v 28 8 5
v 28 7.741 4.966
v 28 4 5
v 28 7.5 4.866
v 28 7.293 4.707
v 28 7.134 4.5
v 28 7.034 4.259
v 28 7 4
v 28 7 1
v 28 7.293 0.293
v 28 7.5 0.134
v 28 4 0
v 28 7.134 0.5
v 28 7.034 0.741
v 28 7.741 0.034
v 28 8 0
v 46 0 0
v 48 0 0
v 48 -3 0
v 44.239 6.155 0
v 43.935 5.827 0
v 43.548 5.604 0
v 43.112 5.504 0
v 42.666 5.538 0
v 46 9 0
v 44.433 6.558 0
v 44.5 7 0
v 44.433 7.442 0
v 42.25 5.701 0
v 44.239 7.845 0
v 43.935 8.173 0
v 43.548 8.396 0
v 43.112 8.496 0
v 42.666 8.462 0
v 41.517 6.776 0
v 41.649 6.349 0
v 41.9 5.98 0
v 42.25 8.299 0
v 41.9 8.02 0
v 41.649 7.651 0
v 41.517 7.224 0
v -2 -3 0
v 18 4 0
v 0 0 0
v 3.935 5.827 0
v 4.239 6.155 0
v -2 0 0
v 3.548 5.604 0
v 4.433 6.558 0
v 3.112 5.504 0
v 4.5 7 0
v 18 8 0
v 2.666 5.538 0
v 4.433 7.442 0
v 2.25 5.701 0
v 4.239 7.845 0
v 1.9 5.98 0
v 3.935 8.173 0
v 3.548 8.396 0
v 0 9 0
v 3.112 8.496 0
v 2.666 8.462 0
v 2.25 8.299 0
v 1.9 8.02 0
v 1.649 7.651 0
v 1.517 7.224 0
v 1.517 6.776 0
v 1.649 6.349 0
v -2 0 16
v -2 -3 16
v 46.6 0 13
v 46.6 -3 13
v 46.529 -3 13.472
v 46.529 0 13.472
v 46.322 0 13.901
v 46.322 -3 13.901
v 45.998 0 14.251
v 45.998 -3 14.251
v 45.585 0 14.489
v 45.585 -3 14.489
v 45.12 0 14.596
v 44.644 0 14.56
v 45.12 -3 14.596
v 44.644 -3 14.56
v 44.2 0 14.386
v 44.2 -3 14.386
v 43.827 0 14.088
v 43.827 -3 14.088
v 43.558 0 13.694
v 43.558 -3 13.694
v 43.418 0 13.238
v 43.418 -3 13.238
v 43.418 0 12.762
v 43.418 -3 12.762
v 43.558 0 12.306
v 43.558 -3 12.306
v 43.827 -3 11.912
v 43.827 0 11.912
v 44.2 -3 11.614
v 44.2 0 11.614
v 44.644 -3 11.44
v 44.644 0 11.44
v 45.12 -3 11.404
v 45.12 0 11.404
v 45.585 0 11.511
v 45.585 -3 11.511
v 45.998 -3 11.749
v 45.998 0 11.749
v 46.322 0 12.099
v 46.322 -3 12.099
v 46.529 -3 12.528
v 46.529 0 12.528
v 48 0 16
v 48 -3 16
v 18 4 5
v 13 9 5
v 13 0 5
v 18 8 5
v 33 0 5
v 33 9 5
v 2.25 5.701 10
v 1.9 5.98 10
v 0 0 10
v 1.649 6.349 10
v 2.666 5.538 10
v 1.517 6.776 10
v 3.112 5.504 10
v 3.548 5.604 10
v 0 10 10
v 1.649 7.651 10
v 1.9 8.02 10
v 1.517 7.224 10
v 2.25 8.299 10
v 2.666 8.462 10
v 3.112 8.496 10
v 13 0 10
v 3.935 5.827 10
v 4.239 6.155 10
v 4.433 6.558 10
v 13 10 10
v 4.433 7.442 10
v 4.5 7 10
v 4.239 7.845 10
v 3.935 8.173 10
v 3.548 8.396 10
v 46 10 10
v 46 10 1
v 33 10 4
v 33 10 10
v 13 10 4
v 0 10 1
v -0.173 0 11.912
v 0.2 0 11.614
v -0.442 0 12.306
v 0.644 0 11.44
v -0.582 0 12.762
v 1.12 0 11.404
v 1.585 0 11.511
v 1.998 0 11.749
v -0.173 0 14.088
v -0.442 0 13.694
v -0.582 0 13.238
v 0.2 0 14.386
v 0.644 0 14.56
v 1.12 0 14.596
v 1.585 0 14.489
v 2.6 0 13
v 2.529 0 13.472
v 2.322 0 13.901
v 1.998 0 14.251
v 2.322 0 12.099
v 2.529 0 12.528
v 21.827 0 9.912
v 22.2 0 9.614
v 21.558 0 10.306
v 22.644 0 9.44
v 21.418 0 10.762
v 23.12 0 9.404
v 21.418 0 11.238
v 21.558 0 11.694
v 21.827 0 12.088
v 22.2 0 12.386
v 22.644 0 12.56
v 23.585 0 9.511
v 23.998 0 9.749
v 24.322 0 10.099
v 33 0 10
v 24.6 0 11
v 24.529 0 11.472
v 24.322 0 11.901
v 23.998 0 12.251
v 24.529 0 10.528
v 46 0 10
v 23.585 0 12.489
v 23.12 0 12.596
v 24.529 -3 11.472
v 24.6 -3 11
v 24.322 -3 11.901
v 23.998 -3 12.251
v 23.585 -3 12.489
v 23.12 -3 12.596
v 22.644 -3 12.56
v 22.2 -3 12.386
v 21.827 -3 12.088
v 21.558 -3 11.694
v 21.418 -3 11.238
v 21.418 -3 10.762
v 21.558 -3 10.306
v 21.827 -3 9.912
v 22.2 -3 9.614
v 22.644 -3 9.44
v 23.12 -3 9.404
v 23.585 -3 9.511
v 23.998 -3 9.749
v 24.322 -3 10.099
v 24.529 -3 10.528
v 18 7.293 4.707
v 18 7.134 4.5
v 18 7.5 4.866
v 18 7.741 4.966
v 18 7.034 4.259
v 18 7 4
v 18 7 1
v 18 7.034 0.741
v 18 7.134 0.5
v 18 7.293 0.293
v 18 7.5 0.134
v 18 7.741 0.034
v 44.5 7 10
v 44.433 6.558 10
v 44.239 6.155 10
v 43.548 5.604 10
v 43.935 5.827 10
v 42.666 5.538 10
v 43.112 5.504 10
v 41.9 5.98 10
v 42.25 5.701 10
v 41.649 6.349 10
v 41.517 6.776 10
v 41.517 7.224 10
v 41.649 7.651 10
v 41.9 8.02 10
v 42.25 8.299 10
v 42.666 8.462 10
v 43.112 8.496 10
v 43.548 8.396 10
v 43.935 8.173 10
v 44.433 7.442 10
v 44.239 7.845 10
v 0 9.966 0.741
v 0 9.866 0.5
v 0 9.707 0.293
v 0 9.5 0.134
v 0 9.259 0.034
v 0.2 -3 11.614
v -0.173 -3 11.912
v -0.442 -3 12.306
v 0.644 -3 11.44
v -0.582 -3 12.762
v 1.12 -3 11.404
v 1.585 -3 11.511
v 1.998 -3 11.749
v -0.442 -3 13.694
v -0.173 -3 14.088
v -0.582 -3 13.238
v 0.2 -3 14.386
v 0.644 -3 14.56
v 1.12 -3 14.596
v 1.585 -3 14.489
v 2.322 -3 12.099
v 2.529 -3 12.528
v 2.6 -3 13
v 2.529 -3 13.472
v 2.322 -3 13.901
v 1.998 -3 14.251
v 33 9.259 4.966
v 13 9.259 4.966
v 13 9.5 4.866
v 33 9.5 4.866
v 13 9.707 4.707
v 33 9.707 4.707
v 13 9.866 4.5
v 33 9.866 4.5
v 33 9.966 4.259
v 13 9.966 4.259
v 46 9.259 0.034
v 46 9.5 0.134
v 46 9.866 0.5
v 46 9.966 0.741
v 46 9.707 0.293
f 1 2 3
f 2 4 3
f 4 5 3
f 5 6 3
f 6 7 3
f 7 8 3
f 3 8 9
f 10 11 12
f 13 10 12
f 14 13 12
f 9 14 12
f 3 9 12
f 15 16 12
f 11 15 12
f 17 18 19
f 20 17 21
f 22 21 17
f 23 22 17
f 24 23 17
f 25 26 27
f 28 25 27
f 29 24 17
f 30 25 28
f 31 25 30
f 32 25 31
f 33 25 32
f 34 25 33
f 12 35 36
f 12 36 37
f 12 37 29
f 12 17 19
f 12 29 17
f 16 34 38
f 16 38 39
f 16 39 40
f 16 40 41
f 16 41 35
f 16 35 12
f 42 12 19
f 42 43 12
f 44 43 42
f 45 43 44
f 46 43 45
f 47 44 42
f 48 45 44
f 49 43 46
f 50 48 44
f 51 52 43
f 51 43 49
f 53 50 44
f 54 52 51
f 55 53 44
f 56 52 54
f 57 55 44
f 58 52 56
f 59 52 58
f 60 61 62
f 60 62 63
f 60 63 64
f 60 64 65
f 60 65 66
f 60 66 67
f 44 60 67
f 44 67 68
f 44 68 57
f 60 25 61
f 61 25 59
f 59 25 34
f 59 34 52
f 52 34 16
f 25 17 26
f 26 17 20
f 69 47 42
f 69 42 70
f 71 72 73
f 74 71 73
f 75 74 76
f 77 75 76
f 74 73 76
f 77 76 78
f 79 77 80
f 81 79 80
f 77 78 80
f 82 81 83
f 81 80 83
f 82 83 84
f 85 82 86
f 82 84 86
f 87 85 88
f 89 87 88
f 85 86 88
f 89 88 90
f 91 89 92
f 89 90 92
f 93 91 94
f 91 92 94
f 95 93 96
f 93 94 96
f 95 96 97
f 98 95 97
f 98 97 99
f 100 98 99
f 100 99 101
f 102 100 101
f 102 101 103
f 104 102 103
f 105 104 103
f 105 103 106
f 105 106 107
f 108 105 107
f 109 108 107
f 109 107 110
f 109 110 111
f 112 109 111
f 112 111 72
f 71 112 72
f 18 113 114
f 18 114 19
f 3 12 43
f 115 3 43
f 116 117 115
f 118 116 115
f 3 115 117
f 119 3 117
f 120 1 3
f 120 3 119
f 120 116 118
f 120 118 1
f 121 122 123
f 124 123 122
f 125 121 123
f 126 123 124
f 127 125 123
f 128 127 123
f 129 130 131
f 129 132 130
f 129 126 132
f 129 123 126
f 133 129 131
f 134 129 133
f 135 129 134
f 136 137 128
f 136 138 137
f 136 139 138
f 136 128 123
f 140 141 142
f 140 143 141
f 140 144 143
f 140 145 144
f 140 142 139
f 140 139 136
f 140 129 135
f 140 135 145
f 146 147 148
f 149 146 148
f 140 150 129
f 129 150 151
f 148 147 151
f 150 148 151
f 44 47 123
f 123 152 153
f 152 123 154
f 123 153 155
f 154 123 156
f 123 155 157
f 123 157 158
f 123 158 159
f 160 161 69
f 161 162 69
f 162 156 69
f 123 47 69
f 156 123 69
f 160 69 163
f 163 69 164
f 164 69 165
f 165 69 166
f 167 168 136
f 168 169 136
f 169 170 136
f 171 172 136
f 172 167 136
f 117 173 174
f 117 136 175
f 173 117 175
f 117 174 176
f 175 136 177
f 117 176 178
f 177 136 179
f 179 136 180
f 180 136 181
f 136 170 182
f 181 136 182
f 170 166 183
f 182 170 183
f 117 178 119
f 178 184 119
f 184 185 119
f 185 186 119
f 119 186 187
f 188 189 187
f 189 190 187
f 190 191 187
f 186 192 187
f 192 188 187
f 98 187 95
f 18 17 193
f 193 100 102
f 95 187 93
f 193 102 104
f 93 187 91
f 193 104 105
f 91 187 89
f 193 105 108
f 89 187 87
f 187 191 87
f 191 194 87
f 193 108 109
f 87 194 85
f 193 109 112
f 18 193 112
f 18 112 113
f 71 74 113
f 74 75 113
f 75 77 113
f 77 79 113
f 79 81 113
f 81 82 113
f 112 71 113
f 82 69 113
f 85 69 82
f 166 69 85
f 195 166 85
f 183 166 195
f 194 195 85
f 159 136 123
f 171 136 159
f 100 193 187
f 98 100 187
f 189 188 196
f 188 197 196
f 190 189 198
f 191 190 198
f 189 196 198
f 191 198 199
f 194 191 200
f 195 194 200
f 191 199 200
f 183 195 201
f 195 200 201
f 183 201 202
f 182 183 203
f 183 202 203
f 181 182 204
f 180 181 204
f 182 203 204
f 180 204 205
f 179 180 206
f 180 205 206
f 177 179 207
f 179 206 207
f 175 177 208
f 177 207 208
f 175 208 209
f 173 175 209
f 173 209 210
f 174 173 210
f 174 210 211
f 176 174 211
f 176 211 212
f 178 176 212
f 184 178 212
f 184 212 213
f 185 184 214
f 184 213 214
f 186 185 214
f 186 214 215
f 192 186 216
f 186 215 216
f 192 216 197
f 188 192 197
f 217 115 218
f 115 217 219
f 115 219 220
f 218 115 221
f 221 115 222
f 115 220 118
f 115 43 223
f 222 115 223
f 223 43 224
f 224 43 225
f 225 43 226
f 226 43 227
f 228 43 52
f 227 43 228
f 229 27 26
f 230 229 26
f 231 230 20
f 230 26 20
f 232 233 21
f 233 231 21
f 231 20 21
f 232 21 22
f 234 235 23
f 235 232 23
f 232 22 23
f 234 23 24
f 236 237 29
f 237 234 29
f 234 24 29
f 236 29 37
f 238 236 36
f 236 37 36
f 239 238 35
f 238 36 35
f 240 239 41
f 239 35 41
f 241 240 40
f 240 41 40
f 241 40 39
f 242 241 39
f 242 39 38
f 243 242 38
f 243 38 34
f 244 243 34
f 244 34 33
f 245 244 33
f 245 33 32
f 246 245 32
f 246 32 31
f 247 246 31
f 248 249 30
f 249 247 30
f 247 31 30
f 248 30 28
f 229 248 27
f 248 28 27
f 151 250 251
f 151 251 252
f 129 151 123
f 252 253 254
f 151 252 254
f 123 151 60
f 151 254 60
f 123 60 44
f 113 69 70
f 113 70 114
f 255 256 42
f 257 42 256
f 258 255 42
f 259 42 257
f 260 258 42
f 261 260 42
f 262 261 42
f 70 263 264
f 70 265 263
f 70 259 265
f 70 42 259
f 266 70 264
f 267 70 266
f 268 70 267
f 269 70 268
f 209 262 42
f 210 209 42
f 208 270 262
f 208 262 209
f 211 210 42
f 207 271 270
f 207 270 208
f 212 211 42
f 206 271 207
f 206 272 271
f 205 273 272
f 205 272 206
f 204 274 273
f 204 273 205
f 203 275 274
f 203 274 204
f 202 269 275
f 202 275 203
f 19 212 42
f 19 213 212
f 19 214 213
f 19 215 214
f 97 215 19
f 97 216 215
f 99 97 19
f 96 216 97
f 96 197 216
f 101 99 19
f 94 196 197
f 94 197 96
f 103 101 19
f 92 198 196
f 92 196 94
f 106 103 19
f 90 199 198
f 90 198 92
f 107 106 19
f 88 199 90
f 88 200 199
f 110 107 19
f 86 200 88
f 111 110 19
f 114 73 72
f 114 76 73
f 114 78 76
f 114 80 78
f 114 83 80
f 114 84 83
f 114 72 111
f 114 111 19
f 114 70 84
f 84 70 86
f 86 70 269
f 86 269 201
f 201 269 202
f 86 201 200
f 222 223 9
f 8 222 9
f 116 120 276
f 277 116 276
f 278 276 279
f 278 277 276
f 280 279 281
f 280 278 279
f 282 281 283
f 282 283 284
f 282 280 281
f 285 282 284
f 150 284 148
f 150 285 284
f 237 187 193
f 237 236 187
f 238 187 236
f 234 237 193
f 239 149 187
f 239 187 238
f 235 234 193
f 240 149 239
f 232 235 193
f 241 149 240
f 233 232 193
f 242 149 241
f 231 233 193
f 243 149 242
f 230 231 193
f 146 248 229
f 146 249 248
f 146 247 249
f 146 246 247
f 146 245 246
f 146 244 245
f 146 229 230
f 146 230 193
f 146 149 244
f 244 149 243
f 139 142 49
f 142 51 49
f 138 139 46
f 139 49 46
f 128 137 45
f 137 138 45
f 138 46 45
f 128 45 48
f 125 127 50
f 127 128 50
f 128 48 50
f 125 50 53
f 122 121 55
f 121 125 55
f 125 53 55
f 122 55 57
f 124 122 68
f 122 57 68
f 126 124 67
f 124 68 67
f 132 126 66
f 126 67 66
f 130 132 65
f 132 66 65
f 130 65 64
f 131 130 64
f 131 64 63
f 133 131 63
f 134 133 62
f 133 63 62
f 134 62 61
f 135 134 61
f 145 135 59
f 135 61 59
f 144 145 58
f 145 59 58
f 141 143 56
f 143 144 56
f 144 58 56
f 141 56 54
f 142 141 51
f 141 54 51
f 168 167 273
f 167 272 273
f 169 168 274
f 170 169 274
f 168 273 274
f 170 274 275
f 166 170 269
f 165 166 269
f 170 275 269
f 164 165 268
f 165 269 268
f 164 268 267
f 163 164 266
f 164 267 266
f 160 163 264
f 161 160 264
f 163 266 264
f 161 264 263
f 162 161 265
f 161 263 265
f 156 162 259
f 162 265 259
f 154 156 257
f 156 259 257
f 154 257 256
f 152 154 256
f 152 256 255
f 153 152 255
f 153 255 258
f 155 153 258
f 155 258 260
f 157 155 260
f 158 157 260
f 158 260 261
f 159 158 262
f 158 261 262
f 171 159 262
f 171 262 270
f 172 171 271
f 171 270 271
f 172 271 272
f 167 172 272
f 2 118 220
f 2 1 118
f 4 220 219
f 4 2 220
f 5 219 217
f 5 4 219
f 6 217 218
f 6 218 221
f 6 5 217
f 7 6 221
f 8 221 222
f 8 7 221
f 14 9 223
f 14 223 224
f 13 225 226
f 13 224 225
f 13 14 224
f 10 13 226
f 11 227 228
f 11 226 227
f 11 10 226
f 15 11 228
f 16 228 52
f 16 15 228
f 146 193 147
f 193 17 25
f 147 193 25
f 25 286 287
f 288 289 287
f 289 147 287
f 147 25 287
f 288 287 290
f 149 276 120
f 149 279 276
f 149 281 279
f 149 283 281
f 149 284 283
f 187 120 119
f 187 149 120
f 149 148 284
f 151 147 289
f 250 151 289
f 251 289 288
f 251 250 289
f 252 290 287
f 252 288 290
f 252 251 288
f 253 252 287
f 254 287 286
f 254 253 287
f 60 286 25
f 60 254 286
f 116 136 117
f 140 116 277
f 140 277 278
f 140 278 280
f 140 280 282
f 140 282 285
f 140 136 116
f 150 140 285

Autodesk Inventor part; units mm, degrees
ref_plane "YZ Plane" through (0, 0, 0) normal (1, 0, 0) x (0, 1, 0)
ref_plane "XZ Plane" through (0, 0, 0) normal (0, 1, 0) x (-1, 0, 0)
ref_plane "XY Plane" through (0, 0, 0) normal (0, 0, 1) x (1, 0, 0)
sketch "Sketch1" plane through (0, 0, 0) normal (0, 0, 1) x (1, 0, 0)
  line L0 (0, 0) -> (46, 0)
  line L1 (46, 0) -> (46, 10)
  line L2 (46, 10) -> (0, 10)
  line L3 (0, 10) -> (0, 0)
  circle A0 centre (3, 7) radius 1.5
  circle A1 centre (43, 7) radius 1.5
  circle A2 centre (13, 3) radius 3
  circle A3 centre (33, 3) radius 3
  line L4 (18, 7) -> (28, 7)
  line L5 (28, 7) -> (28, 4)
  line L6 (28, 4) -> (18, 4)
  line L7 (18, 4) -> (18, 7)
  point P0 (23, 7)
  point P1 (23, 10)
  dimension "d2" = 10
  dimension "d3" = 3
  dimension "d4" = 3
  dimension "d5" = 3
  dimension "d6" = 3
  dimension "d7" = 3
  dimension "d8" = 40
  dimension "d11" = 6
  dimension "d12" = 6
  dimension "d13" = 10
  dimension "d14" = 10
  dimension "d26" = 7
  dimension "d27" = 10
  dimension "d28" = 3
extrude "Extrusion1" add sketch "Sketch1" along normal blind 10 contours A2 | A3 | L3 L2 L1 L0
sketch "Sketch2" plane through (0, 0, 10) normal (0, 0, 1) x (1, 0, 0)
  line L0 (46, 10) -> (0, 10) projected
  line L1 (0, 0) -> (46, 0) projected
  line L2 (13, 10) -> (33, 10)
  line L3 (33, 10) -> (33, 0)
  line L4 (33, 0) -> (13, 0)
  line L5 (13, 0) -> (13, 10)
  point P0 (23, 10)
  point P1 (23, 10)
  dimension "d15" = 20
extrude "Extrusion2" cut sketch "Sketch2" against normal blind 5
sketch "Sketch3" plane through (0, 0, 0) normal (0, -1, 0) x (1, 0, 0)
  line L0 (-2, 16) -> (48, 16)
  line L1 (48, 16) -> (48, 0)
  line L2 (48, 0) -> (-2, 0)
  line L3 (-2, 0) -> (-2, 16)
  line L4 (0, 10) -> (13, 10) projected
  line L5 (0, 0) -> (0, 10) projected
  line L6 (46, 0) -> (46, 10) projected
  line L7 (0, 0) -> (46, 0) projected
  point P0 (23, 16)
  point P1 (23, 0)
  dimension "d19" = 6
  dimension "d22" = 0
  dimension "d30" = 50
extrude "Extrusion3" add sketch "Sketch3" along normal blind 3
fillet "Fillet1" radius 1 4 edges at (23, 10, 5) (23, 10, 0) (23, 7, 0) (23, 7, 5)
sketch "Sketch4" plane through (0, -3, 0) normal (0, -1, 0) x (1, 0, 0)
  circle A0 centre (1, 13) radius 1.6
  circle A1 centre (45, 13) radius 1.6
  line L0 (48, 16) -> (-2, 16) projected
  circle A2 centre (23, 11) radius 1.6
  point P0 (0, 0)
  point P1 (23, 16)
  dimension "d32" = 3.2
  dimension "d33" = 3.2
  dimension "d34" = 3
  dimension "d35" = 3
  dimension "d36" = 3
  dimension "d37" = 3
  dimension "d38" = 3.2
  dimension "d39" = 5
extrude "Extrusion4" cut sketch "Sketch4" against normal blind 10
equation "\"d11\" = d12"
equation "\"d19\" = d20"
equation "\"d32\" = d38"
equation "\"d33\" = d38"
equation "\"d20\" = 6"
properties part number "z endcap"
